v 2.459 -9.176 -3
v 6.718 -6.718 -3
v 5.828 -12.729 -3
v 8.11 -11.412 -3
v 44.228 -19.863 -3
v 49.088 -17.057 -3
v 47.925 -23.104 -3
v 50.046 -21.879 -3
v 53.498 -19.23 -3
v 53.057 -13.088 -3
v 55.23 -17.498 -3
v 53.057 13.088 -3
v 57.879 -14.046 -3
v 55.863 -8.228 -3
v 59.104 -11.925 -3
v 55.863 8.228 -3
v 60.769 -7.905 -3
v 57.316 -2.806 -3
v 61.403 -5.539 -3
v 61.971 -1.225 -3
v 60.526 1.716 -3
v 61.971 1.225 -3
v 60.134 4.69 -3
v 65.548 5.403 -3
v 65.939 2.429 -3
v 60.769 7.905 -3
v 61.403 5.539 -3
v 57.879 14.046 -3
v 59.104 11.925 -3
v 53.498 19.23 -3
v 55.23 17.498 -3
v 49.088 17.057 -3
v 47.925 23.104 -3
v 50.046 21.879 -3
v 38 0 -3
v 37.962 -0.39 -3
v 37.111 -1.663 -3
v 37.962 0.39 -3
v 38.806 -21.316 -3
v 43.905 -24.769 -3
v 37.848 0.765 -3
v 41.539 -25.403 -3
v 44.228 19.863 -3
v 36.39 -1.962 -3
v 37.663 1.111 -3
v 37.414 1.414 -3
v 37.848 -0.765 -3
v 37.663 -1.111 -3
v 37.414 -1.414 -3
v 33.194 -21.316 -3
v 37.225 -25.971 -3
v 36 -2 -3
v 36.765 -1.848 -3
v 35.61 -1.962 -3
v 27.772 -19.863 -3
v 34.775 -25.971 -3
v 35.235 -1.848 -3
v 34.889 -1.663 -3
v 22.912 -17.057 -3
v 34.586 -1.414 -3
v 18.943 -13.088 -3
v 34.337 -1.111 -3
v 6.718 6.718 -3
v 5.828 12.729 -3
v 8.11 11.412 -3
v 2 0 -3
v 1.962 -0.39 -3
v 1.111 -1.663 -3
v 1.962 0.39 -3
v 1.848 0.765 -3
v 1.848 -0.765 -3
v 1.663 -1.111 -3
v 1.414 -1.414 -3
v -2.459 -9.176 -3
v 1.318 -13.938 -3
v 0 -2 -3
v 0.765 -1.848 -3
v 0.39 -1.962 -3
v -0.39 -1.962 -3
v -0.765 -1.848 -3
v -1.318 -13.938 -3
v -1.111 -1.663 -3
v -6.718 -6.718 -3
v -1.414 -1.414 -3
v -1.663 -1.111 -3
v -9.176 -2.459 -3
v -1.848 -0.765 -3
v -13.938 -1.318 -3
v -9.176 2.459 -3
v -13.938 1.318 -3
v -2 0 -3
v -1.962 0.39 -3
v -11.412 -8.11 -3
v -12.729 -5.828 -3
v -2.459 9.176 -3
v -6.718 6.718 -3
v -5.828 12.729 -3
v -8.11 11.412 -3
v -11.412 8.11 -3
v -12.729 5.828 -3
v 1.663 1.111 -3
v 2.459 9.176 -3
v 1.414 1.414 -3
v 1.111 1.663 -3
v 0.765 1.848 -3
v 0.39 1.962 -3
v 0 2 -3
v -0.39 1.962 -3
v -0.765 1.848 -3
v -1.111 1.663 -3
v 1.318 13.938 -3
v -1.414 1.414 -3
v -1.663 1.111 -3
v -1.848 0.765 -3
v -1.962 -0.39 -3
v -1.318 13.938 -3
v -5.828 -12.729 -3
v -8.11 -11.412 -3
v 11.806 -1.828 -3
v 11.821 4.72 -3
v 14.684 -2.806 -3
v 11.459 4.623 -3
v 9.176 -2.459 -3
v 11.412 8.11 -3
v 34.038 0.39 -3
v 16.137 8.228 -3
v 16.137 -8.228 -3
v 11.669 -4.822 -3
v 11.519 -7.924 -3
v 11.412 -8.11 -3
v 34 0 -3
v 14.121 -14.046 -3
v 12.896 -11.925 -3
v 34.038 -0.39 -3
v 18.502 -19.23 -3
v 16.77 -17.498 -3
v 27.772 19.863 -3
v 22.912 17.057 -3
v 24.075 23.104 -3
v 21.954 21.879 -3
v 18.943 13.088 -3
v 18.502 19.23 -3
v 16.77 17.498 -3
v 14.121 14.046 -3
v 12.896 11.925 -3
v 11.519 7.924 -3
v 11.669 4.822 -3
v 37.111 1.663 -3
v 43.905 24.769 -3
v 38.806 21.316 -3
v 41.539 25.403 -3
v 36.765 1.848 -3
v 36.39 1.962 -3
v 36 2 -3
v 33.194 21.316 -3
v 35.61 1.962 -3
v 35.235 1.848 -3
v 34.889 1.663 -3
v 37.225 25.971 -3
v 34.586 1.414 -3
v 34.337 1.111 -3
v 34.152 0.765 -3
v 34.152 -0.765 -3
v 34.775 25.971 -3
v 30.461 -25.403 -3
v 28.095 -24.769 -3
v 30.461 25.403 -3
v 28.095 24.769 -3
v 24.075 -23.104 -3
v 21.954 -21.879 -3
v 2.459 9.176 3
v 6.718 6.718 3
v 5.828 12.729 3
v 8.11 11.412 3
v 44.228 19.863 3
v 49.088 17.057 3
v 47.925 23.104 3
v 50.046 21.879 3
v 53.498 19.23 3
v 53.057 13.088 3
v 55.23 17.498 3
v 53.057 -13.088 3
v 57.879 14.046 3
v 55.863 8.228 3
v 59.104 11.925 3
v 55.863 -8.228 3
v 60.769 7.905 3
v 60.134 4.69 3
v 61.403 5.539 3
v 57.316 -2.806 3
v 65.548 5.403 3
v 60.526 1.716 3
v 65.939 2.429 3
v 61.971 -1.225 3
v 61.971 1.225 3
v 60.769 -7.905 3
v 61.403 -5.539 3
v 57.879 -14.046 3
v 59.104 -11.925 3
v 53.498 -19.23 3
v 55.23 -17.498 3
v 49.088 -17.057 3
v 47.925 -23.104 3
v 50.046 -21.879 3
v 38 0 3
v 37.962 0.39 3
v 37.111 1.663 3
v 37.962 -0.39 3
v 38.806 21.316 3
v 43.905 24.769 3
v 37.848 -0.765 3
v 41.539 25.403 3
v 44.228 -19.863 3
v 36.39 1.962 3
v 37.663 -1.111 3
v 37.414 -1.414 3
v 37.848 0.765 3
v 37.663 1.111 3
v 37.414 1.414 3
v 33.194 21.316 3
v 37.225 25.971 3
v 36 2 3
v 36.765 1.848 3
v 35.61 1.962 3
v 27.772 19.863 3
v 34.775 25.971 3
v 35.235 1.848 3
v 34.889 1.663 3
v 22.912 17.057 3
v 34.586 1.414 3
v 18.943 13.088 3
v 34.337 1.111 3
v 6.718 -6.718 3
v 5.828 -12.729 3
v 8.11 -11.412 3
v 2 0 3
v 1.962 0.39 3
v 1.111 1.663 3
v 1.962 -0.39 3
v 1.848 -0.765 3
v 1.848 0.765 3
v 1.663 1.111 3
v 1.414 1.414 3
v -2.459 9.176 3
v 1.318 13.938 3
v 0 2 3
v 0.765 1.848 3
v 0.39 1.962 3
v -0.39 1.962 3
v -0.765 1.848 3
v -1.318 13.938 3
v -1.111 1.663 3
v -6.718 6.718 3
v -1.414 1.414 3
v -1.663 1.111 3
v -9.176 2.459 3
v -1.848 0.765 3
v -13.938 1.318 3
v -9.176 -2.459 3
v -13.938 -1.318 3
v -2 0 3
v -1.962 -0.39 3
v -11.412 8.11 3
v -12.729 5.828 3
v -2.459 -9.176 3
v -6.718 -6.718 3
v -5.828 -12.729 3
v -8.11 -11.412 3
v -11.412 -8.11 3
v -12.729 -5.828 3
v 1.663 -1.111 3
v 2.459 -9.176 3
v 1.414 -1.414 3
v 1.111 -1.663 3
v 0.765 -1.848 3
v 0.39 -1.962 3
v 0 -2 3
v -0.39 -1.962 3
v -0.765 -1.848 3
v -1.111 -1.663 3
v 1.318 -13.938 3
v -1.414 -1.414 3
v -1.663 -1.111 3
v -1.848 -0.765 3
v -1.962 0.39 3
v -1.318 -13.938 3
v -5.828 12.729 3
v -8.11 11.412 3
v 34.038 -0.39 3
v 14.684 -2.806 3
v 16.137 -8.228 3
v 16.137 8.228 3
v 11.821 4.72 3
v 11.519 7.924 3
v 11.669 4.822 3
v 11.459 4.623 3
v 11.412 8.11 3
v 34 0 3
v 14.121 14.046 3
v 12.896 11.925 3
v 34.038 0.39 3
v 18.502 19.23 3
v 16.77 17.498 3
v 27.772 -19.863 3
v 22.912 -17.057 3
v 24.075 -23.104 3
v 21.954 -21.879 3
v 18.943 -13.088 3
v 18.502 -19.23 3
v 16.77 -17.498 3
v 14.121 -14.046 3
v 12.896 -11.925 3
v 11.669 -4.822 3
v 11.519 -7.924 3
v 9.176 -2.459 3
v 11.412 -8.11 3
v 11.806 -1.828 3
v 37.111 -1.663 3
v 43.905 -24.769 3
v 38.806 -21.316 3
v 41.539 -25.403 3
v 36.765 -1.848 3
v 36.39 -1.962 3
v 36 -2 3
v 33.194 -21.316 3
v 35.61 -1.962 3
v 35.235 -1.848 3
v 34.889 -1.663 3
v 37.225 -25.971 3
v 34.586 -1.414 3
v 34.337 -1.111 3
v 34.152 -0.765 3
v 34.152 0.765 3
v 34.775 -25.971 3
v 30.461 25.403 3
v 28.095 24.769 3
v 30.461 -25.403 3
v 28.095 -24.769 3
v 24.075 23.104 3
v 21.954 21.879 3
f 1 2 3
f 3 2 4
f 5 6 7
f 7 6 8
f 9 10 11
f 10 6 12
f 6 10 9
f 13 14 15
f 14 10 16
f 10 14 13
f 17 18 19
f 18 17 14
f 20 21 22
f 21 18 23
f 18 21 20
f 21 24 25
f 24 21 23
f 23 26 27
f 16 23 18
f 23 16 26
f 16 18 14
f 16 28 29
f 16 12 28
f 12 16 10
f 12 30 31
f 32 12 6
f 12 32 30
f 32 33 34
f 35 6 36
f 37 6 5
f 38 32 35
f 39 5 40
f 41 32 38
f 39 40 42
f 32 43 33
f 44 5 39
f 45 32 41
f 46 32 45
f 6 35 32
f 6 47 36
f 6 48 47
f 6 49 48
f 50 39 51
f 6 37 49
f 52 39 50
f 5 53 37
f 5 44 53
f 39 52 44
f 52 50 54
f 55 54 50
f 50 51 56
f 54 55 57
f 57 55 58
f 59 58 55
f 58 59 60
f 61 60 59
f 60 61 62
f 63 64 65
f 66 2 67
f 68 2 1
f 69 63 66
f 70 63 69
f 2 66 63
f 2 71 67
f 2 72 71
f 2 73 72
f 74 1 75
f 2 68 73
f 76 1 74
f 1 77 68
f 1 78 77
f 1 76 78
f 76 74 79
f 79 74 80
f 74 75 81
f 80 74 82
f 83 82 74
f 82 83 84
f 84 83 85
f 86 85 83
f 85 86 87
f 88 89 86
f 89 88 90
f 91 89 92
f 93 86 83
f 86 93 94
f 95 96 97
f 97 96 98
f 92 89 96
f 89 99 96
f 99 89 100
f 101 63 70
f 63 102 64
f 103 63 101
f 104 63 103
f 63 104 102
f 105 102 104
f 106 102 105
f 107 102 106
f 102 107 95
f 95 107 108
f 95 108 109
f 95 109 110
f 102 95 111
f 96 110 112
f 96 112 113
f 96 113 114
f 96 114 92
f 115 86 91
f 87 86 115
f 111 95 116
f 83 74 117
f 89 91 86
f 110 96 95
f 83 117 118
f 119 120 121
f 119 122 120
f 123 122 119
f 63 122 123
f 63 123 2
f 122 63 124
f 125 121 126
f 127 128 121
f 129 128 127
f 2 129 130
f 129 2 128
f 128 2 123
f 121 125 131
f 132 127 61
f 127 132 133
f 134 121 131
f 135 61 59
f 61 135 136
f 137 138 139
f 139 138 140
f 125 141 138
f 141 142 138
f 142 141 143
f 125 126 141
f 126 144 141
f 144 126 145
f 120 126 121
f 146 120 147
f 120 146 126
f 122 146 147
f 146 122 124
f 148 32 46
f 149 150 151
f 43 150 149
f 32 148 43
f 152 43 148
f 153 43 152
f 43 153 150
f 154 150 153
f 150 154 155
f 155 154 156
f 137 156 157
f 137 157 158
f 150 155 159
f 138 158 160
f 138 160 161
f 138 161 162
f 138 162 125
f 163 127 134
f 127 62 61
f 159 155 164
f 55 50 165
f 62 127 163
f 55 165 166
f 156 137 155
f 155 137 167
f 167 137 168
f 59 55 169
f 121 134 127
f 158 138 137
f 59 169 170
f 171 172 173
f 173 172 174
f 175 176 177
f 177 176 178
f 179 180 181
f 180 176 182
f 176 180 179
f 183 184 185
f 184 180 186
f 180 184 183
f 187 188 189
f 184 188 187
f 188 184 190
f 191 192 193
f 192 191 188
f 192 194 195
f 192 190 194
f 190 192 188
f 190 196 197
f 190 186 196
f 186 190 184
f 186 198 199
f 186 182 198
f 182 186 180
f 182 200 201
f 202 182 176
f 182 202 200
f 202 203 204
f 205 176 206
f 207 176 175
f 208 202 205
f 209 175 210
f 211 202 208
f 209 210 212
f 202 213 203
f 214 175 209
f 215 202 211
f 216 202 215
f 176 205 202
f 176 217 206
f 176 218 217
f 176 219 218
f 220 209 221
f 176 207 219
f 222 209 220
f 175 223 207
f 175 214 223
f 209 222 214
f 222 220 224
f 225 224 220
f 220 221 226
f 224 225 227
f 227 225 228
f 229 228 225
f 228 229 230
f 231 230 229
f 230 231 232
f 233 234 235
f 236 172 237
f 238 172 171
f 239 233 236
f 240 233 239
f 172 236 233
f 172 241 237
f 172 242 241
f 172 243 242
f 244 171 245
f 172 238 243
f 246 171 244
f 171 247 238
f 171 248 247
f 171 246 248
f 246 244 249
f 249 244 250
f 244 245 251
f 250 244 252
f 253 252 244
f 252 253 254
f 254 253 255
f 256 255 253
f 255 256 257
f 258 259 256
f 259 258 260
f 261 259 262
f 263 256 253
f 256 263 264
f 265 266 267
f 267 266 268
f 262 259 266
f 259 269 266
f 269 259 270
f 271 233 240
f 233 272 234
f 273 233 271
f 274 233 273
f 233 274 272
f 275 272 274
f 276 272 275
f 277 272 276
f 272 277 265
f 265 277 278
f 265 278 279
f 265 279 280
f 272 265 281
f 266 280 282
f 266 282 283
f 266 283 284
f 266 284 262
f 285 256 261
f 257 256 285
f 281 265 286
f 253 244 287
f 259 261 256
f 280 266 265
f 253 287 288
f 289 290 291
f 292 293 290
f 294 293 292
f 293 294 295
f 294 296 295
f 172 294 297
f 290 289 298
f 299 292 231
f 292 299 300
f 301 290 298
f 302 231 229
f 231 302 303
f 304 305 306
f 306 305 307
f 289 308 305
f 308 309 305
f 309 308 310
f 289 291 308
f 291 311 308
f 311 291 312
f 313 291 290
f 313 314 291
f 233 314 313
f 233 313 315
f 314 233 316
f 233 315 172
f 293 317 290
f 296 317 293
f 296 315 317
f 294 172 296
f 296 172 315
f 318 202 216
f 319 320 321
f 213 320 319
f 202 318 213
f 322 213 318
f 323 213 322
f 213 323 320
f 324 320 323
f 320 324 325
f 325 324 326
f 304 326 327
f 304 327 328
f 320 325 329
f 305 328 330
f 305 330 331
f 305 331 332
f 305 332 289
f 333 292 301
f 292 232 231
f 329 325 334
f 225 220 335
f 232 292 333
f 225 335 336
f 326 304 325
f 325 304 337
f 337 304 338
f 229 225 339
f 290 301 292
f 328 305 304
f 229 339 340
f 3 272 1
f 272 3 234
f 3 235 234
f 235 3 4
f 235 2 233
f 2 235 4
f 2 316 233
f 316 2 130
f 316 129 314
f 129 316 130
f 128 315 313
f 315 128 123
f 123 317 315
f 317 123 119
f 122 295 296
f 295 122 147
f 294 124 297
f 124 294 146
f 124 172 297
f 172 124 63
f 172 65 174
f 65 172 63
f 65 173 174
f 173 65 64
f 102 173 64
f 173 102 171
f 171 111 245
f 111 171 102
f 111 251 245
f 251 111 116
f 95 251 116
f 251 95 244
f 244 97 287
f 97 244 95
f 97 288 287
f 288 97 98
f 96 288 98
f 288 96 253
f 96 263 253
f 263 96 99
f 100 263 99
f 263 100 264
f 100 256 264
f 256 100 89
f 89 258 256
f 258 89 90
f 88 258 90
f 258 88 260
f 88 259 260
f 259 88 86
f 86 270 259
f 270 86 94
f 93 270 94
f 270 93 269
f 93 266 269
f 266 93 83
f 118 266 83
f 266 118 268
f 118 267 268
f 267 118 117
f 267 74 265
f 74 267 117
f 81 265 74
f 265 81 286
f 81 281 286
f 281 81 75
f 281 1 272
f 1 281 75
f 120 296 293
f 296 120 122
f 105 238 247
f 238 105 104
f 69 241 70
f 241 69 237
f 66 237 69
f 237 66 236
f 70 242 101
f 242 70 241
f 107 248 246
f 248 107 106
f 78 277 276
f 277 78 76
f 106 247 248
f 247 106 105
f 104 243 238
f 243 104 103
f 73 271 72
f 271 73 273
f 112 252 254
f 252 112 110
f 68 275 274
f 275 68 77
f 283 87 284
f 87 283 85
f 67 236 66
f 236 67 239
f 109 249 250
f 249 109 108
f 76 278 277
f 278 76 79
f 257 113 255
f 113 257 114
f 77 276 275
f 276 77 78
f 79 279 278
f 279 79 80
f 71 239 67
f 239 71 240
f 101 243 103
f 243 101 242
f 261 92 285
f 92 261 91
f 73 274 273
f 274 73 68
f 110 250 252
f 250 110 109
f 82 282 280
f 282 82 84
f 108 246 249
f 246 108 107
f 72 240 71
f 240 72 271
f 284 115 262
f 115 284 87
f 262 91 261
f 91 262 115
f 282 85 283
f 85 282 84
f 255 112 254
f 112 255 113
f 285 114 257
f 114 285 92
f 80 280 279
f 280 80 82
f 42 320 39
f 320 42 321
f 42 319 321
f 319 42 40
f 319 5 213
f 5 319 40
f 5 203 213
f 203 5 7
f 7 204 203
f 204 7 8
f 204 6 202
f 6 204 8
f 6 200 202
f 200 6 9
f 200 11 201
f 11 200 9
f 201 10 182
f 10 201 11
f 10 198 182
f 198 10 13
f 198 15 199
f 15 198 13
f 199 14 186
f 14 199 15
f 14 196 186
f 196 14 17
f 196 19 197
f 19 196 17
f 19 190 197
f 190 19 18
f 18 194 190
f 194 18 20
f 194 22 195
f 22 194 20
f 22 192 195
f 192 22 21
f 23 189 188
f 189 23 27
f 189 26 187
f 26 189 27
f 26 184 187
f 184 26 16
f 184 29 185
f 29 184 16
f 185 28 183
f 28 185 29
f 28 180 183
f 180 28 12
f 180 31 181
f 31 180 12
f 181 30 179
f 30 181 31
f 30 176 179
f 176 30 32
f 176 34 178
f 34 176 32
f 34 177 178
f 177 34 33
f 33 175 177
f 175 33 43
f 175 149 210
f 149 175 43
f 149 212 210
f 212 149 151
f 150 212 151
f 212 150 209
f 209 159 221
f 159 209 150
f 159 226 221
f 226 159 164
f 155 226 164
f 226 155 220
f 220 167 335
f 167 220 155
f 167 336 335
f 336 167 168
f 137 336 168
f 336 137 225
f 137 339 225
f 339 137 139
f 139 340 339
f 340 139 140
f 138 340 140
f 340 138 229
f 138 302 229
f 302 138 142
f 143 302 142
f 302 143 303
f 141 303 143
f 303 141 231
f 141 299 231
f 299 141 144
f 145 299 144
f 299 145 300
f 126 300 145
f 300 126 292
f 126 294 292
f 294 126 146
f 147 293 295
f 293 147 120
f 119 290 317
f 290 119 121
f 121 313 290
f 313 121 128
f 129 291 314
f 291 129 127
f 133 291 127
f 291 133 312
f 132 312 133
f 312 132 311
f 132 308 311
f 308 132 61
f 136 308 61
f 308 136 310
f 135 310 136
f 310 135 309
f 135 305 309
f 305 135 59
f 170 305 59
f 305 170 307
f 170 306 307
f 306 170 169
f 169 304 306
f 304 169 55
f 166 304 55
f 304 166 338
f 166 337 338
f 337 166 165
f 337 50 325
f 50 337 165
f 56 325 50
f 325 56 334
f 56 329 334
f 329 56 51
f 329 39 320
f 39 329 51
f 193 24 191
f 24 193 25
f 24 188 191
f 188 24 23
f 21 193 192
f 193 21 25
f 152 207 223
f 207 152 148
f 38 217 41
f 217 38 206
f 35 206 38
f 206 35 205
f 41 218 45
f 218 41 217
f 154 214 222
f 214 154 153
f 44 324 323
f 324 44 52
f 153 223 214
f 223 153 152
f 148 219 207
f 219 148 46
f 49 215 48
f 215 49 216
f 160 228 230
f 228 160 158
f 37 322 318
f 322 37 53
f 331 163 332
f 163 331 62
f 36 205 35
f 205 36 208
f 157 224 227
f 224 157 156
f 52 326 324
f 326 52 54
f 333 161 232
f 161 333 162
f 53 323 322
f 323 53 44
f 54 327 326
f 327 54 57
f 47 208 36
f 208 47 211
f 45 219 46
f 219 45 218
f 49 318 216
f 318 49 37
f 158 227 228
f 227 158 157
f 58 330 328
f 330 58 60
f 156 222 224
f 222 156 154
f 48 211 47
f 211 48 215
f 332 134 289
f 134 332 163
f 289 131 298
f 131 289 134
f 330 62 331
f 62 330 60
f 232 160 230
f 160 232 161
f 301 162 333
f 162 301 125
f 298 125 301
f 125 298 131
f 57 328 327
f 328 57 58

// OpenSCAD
// Original external spur-gear pair fixture, millimetres.
// Two gears with a radial index tab; the tab is a measurement feature, not a
// claim about tooth contact, backlash, strength or manufacturing tolerance.
agentscad_part = "all";
agentscad_pose = false;
input_deg = 0;
ratio_sign = 1;

module_mm = 2;
pinion_teeth = 12;
wheel_teeth = 24;
thickness = 6;
center_distance = module_mm * (pinion_teeth + wheel_teeth) / 2;
pinion_pitch = module_mm * pinion_teeth / 2;
wheel_pitch = module_mm * wheel_teeth / 2;
addendum = module_mm;
dedendum = 1.25 * module_mm;
marker_min_r_mm = 0;
marker_max_r_mm = 0;

wheel_angle_deg = ratio_sign * input_deg * pinion_teeth / wheel_teeth;

module gear_outline(teeth, pitch_radius) {
  tip_radius = pitch_radius + addendum;
  root_radius = pitch_radius - dedendum;
  half_pitch_deg = 180 / teeth;
  tip_half_deg = 0.18 * 360 / teeth;
  points = [
    for (i = [0 : teeth - 1], k = [0 : 2])
      let (a = i * 360 / teeth + (k == 0 ? -half_pitch_deg : (k == 1 ? -tip_half_deg : tip_half_deg)),
           r = k == 0 ? root_radius : tip_radius)
      [r * cos(a), r * sin(a)]
  ];
  linear_extrude(height = thickness, center = true, convexity = 10)
    polygon(points = points);
}

module gear_body(teeth, pitch_radius) {
  root_r = pitch_radius - dedendum;
  tip_r = pitch_radius + addendum;
  // Radial index tab in a root gap (half a tooth pitch from the first tooth).
  // Its outer vertices are the only measurement feature outside the addendum.
  marker_angle = 180 / teeth;
  marker_outer_r = tip_r + 4;
  marker_inner_r = root_r - 0.5;
  difference() {
    union() {
      gear_outline(teeth, pitch_radius);
      rotate([0, 0, marker_angle])
        translate([(marker_inner_r + marker_outer_r) / 2, 0, 0])
          cube([marker_outer_r - marker_inner_r, 3, thickness], center = true);
    }
    cylinder(h = thickness + 2, r = 2, center = true, $fn = 32);
  }
}

module pinion_local() { gear_body(pinion_teeth, pinion_pitch); }
module wheel_local() { gear_body(wheel_teeth, wheel_pitch); }

module generated_part() {
  if (agentscad_part == "pinion") {
    pinion_local();
  } else if (agentscad_part == "wheel") {
    wheel_local();
  } else if (agentscad_part == "pinion_pose") {
    rotate([0, 0, input_deg]) pinion_local();
  } else if (agentscad_part == "wheel_pose") {
    translate([center_distance, 0, 0])
      rotate([0, 0, wheel_angle_deg]) wheel_local();
  } else {
    rotate([0, 0, input_deg]) pinion_local();
    translate([center_distance, 0, 0])
      rotate([0, 0, wheel_angle_deg]) wheel_local();
  }
}

generated_part();
